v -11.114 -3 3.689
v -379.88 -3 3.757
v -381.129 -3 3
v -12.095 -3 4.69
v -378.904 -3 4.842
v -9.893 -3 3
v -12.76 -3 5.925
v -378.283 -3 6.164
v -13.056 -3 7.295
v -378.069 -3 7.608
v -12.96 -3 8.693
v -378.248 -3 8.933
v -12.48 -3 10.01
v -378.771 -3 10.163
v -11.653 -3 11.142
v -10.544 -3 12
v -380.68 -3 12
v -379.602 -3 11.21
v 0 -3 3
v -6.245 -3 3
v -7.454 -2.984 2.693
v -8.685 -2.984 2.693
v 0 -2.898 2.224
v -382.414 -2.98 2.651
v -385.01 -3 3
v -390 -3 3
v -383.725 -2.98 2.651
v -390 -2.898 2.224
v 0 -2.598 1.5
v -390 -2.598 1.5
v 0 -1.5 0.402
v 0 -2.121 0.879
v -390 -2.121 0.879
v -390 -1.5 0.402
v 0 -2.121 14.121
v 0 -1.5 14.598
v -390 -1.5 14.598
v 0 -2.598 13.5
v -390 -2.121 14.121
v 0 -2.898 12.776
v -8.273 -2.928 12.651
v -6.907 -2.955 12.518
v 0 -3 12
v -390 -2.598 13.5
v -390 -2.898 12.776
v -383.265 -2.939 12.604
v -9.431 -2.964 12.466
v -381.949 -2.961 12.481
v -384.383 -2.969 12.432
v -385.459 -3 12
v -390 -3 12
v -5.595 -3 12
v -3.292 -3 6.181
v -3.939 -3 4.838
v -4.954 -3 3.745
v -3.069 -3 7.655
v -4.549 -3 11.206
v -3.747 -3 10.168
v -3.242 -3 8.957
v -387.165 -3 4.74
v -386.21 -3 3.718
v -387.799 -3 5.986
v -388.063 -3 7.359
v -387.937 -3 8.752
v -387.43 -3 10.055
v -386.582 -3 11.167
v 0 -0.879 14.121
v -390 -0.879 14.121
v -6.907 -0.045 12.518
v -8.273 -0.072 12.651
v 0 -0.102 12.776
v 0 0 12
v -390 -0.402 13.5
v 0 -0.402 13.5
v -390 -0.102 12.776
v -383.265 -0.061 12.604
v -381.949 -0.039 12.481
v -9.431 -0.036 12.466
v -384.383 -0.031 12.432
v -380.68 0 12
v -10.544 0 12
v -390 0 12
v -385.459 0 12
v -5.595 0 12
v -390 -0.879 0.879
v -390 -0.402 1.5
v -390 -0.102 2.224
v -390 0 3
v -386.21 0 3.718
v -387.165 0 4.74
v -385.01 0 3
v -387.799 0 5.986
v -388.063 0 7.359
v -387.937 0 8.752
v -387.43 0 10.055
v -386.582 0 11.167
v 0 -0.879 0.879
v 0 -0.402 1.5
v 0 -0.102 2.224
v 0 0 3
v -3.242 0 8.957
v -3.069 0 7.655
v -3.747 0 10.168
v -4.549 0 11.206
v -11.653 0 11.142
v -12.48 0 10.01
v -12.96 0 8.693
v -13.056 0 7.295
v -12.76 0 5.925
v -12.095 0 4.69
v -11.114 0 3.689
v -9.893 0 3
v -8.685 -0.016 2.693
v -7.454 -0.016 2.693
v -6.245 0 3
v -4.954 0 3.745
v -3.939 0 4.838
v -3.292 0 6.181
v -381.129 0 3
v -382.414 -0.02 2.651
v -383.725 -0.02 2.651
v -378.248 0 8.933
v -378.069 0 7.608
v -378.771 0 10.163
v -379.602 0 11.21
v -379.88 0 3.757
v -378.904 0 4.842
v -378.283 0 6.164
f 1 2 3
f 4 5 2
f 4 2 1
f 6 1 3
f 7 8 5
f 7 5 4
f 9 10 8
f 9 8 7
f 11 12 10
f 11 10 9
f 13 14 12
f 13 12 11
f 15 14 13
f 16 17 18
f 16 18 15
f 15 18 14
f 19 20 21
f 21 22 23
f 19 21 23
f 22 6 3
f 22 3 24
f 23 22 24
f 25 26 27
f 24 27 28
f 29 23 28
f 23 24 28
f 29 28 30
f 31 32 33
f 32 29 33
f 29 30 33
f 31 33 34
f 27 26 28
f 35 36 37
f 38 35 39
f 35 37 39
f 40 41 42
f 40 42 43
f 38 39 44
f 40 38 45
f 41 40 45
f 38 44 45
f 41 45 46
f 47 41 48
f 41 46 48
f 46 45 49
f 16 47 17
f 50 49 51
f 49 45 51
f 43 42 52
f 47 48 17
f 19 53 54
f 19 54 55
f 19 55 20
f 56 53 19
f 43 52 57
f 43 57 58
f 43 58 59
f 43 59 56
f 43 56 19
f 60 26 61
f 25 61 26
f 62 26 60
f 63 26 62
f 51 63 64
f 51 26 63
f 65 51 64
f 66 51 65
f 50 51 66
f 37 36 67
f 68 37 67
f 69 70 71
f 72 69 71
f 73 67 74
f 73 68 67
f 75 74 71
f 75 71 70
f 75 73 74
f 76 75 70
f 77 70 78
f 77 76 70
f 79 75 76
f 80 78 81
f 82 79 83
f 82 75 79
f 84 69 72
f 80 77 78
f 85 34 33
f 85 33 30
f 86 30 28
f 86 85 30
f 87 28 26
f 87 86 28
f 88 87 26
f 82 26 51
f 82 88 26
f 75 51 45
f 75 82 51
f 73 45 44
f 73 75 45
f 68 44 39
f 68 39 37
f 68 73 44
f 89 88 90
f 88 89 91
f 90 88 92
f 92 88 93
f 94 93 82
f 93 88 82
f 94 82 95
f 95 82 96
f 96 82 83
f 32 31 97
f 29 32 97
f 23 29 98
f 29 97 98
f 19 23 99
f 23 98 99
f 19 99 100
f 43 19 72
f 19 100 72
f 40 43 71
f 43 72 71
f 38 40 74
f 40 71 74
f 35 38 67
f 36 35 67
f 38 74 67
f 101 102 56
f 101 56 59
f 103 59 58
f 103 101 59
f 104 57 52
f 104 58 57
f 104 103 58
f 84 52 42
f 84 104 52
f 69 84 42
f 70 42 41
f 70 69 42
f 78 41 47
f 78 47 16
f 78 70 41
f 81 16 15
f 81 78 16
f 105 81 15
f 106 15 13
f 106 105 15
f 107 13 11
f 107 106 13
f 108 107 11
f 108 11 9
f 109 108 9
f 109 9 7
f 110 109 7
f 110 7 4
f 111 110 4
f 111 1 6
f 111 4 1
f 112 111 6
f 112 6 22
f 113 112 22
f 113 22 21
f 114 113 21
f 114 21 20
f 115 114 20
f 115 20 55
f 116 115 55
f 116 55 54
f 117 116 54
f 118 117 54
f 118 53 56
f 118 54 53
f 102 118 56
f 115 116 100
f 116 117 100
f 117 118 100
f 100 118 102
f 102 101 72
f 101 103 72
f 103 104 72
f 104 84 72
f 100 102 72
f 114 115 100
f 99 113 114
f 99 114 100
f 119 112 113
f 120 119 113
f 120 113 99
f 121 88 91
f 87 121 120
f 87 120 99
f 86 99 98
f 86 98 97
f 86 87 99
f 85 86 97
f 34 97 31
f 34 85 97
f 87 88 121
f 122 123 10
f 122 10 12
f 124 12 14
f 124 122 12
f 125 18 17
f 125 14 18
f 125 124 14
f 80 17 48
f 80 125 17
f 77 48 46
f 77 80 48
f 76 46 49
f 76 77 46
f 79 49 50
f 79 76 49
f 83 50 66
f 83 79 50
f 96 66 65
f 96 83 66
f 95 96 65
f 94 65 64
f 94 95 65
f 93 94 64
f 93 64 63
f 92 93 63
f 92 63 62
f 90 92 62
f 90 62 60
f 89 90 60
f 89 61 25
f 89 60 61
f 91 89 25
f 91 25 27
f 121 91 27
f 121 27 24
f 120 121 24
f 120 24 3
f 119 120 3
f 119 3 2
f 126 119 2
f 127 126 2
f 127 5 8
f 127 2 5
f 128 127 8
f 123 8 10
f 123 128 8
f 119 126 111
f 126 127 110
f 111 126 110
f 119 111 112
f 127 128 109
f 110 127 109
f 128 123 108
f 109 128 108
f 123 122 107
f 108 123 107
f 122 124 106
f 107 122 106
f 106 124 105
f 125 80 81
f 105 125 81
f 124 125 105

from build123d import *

# Parameters (mm, degrees)
F0_W        = 390
F0_H        = 15
F1_DEPTH    = 3
F2_R        = 5
F3_DEPTH    = 20
F4_T1_DEPTH = 405


# Not quite as in the source:
# - a fillet or chamfer that OpenCascade refuses, or shapes differently, is made with other operations: its cross-section is extruded or revolved along the edge and cut away or added


with BuildPart() as f1:
    # F0 (on Front) → F1 (new body)
    with BuildSketch(Plane.XZ):
        with Locations((-195, 7.5)):
            Rectangle(F0_W, F0_H)
    extrude(amount=F1_DEPTH)

    # F2 (on Front) → F3 (cut)
    with BuildSketch(Plane.XZ):
        with Locations((-383.0693596974, 7.6079843566)):
            Circle(F2_R)
        with Locations((-8.0693596974, 7.6553751715)):
            Circle(F2_R)
    extrude(amount=F3_DEPTH, mode=Mode.SUBTRACT)

    # F4: fillet of radius 3 on 4 edges, made by hand

    # F4_s2 → F4_t1 (cut)
    with BuildSketch(Plane.YZ.offset(-397.5)):
        with BuildLine():
            ThreePointArc((-3, 15), (-0.8786796564, 14.1213203436), (0, 12))
            Line((0, 12), (0, 15))
            Line((0, 15), (-3, 15))
        make_face()
        with BuildLine():
            ThreePointArc((0, 3), (-0.8786796564, 0.8786796564), (-3, 0))
            Line((-3, 0), (0, 0))
            Line((0, 0), (0, 3))
        make_face()
        with BuildLine():
            ThreePointArc((0, 15), (-2.1213203436, 14.1213203436), (-3, 12))
            Line((-3, 12), (-3, 15))
            Line((-3, 15), (0, 15))
        make_face()
        with BuildLine():
            ThreePointArc((-3, 3), (-2.1213203436, 0.8786796564), (0, 0))
            Line((0, 0), (-3, 0))
            Line((-3, 0), (-3, 3))
        make_face()
    extrude(amount=F4_T1_DEPTH, mode=Mode.SUBTRACT)


solid = f1.part
